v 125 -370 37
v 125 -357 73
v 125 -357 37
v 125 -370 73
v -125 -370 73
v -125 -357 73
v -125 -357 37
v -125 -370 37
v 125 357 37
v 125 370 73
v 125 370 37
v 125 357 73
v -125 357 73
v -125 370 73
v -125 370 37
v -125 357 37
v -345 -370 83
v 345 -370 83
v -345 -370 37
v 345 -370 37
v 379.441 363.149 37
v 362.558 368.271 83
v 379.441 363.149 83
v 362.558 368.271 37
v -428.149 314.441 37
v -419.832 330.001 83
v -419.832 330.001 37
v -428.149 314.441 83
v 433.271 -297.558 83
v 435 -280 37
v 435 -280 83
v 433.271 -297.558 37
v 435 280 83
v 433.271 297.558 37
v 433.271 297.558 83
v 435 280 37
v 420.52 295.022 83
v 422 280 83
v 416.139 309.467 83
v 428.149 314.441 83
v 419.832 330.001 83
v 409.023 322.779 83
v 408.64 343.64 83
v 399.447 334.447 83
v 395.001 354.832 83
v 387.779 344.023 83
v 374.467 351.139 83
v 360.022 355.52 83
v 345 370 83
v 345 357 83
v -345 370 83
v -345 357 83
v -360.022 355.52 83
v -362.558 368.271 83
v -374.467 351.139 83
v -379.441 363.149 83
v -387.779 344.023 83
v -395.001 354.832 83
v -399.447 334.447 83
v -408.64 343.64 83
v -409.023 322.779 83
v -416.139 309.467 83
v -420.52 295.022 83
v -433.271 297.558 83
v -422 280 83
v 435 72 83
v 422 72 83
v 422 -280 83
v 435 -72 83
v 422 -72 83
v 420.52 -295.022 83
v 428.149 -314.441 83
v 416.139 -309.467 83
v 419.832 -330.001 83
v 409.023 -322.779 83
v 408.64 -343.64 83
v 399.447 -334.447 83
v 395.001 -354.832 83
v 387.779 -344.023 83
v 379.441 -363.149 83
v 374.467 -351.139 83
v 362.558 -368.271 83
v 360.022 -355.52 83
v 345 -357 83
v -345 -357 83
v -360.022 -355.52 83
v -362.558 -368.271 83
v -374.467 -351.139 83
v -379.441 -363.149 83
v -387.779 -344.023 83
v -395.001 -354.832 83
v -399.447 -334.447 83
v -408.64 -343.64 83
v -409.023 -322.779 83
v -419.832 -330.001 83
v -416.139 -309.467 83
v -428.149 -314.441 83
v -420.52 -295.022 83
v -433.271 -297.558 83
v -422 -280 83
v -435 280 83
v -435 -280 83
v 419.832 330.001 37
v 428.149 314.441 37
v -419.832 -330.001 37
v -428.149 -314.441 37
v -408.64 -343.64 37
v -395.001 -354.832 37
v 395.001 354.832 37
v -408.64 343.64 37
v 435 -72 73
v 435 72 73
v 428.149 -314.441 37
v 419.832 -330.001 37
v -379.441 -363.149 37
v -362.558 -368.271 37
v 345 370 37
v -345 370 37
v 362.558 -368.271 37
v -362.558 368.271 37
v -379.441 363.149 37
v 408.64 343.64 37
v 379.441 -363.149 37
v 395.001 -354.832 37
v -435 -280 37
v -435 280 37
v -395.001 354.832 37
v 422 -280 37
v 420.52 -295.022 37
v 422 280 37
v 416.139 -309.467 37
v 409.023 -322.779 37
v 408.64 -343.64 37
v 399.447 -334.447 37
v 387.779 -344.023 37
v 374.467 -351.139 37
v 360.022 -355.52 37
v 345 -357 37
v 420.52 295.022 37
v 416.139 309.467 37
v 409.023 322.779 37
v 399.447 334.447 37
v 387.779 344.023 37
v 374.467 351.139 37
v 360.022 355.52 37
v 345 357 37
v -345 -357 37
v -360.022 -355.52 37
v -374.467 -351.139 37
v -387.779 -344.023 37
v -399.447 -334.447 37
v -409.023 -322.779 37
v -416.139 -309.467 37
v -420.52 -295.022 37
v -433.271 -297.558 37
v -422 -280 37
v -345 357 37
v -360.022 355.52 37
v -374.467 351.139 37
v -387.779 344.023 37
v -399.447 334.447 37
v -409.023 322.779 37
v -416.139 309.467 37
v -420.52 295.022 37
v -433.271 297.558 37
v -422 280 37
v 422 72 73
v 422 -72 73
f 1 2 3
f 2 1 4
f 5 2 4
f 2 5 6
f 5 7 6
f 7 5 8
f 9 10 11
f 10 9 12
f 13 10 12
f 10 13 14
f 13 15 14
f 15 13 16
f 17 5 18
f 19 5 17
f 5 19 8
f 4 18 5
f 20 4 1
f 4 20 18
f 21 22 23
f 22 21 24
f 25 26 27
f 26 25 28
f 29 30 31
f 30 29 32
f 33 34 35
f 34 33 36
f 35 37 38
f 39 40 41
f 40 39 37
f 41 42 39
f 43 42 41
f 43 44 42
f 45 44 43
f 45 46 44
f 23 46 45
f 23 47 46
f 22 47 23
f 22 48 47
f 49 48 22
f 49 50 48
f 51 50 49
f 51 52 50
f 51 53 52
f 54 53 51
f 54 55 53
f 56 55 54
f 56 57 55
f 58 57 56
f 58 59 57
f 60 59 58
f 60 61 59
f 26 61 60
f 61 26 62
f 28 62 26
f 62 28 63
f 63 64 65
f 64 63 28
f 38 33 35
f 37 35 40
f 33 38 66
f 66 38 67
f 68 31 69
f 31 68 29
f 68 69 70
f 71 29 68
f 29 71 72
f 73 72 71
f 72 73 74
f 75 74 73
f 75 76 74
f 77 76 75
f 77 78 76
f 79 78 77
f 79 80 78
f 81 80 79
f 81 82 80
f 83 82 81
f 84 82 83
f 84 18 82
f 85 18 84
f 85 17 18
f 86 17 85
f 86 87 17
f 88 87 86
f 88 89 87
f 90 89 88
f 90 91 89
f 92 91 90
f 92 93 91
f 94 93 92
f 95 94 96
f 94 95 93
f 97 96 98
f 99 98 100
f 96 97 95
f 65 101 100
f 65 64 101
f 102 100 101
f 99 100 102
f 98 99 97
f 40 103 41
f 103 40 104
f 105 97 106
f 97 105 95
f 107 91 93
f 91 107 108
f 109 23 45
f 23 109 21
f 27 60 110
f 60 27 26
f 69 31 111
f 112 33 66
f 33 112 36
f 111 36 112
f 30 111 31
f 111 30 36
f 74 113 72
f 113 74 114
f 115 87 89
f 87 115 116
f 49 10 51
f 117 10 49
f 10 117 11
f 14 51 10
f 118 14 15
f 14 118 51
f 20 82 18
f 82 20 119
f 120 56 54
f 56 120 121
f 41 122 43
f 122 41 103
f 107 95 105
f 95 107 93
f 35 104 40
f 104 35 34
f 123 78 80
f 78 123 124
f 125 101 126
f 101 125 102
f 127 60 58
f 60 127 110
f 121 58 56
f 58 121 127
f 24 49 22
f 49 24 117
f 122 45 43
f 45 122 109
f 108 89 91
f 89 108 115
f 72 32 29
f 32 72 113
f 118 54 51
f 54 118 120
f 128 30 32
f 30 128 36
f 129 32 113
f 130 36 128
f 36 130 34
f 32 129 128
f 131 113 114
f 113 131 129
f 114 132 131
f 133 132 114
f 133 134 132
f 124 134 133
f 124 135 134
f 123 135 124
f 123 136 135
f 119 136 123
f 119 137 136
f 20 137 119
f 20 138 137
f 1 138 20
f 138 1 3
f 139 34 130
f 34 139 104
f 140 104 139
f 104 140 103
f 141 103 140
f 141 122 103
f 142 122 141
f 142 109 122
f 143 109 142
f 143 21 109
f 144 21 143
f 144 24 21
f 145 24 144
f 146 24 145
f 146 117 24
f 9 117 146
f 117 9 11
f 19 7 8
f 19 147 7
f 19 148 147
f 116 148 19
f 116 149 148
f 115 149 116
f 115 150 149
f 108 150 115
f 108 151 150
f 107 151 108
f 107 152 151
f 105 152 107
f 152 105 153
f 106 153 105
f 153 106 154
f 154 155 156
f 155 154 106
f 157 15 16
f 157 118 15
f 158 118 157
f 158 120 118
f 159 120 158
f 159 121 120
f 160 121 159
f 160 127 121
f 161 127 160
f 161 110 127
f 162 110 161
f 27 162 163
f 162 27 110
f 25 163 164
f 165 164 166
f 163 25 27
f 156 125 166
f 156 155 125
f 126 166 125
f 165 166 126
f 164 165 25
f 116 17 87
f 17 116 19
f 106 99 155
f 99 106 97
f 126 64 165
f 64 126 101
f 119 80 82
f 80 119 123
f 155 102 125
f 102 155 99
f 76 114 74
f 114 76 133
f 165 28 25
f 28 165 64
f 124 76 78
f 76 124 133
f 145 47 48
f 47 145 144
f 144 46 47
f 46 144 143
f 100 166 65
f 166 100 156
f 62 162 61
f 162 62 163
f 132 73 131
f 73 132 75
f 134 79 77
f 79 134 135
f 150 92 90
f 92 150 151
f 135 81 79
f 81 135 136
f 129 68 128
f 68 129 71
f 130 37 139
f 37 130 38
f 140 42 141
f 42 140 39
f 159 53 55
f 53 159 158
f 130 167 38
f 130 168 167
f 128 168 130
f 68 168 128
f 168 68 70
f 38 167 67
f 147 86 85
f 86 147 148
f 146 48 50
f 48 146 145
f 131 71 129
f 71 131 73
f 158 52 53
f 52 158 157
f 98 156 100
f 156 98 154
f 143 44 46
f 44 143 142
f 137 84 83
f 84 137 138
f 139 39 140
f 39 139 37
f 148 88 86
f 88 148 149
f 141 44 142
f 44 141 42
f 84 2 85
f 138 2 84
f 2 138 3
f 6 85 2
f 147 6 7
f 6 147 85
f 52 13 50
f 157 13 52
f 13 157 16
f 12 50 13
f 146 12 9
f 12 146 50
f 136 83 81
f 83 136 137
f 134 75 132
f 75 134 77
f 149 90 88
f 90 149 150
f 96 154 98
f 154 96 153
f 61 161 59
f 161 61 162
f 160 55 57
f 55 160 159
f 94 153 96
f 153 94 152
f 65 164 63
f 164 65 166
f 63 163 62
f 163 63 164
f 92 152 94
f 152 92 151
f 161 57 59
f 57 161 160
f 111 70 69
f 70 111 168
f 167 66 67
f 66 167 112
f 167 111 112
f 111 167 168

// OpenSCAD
export_only = true;
include <main.scad>
body_bumper_profile();
